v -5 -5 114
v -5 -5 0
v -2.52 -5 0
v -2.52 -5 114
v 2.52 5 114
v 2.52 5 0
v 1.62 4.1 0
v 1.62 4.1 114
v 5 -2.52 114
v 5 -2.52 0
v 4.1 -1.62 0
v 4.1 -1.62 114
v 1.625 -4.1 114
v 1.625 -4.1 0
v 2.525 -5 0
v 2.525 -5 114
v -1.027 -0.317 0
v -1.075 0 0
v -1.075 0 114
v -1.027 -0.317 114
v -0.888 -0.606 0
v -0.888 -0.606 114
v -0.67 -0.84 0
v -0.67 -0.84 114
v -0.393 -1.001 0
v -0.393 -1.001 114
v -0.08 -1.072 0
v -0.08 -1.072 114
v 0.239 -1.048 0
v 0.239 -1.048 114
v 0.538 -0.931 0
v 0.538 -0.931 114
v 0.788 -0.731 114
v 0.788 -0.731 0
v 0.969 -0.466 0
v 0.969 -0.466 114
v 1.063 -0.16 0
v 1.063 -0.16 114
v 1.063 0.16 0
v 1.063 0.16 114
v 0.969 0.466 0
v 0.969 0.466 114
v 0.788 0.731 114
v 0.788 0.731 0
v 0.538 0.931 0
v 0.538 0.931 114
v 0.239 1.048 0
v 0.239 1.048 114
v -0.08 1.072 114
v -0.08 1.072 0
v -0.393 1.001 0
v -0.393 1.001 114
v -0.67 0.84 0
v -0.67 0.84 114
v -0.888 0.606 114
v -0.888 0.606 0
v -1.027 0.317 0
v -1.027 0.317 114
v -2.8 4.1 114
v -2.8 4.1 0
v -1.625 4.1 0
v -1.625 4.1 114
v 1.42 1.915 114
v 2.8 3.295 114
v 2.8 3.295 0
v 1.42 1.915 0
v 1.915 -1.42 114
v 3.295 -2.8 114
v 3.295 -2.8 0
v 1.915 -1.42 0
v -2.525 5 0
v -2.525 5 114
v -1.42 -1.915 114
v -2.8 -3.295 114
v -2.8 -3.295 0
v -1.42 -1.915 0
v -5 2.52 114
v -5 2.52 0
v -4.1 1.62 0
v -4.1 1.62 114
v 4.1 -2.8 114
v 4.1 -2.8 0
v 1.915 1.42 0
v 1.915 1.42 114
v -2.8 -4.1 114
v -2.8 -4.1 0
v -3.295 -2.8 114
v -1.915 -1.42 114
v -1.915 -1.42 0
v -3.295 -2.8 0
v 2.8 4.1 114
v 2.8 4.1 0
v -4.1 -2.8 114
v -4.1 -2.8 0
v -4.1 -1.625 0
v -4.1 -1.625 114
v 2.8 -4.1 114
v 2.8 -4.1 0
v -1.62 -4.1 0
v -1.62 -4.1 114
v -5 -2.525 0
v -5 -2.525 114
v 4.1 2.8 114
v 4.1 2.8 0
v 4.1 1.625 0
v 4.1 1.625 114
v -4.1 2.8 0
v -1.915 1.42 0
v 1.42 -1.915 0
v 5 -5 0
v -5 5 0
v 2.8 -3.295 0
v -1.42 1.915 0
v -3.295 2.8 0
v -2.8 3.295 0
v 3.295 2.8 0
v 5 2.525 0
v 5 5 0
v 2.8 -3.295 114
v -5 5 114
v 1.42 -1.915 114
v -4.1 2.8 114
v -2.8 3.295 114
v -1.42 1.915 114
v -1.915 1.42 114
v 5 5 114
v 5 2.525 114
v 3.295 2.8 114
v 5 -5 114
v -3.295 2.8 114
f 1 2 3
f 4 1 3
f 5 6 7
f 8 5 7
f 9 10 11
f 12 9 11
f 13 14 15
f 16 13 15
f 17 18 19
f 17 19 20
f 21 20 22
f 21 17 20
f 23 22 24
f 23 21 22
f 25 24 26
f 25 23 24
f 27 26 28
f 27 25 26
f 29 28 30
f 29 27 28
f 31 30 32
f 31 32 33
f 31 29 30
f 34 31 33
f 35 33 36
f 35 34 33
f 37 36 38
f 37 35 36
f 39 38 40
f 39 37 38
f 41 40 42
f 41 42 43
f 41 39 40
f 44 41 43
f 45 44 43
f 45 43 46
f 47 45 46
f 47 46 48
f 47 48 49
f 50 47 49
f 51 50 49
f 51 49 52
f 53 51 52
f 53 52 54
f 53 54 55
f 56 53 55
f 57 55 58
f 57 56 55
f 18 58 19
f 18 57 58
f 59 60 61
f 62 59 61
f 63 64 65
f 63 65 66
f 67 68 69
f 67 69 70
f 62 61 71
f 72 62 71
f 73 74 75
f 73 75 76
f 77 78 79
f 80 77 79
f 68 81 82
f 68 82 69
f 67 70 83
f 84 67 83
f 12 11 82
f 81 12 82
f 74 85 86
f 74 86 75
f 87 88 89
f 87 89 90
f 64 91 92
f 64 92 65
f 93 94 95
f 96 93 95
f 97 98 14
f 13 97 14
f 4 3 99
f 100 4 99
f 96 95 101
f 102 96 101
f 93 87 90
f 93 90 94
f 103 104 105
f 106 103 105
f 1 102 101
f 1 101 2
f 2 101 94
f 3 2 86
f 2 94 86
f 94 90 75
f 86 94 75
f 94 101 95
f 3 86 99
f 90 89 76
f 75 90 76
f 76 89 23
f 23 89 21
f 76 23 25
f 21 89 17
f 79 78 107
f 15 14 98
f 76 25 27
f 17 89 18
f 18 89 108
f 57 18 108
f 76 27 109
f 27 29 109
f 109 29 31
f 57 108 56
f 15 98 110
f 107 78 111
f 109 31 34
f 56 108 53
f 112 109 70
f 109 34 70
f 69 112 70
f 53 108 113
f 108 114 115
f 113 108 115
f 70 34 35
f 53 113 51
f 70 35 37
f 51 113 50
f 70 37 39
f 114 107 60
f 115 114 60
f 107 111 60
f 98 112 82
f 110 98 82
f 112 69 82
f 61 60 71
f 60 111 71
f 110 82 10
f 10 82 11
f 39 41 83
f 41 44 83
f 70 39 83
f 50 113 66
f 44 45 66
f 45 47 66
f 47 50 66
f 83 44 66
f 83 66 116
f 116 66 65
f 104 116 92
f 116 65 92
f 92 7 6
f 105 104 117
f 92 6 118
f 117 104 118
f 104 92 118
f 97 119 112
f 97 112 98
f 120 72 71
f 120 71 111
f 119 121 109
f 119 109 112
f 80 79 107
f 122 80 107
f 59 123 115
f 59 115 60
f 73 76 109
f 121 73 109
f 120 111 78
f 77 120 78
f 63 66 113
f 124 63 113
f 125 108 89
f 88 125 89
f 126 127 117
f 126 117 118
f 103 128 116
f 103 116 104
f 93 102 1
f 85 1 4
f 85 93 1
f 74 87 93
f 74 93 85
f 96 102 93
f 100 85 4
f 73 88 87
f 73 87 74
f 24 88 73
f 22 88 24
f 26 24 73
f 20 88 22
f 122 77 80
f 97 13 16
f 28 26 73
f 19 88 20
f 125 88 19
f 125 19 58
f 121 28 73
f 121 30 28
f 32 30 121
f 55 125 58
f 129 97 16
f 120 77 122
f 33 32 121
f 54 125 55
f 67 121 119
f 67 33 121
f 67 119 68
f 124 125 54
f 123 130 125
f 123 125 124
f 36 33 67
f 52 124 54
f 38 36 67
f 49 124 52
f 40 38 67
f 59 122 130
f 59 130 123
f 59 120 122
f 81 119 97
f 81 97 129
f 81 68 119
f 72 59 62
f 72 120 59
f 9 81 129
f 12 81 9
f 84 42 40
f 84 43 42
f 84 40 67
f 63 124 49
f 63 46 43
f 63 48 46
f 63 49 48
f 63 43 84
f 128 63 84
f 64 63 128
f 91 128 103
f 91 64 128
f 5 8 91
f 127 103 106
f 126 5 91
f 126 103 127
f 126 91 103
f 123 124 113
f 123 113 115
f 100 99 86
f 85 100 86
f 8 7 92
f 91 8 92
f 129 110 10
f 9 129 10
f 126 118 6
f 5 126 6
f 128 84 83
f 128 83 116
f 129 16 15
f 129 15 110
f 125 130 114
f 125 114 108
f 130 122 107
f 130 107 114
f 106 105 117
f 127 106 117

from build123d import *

# Parameters (mm, degrees)
CROQUIS1_R              = 1.075
SALIENTE_EXTRUIR1_DEPTH = 114


with BuildPart() as part:
    # Croquis1 → Saliente-Extruir1 (new body)
    with BuildSketch(Plane.XY):
        Polygon((-1.420025253, 1.915), (-2.8, 3.294974747), (-2.8, 4.1), (-1.625, 4.1), (-2.525, 5), (-5, 5), (-5, 2.52), (-4.1, 1.62), (-4.1, 2.8), (-3.294974747, 2.8), (-1.915, 1.420025253), (-1.915, -1.420025253), (-3.294974747, -2.8), (-4.1, -2.8), (-4.1, -1.625), (-5, -2.525), (-5, -5), (-2.52, -5), (-1.62, -4.1), (-2.8, -4.1), (-2.8, -3.294974747), (-1.420025253, -1.915), (1.420025253, -1.915), (2.8, -3.294974747), (2.8, -4.1), (1.625, -4.1), (2.525, -5), (5, -5), (5, -2.52), (4.1, -1.62), (4.1, -2.8), (3.294974747, -2.8), (1.915, -1.420025253), (1.915, 1.420025253), (3.294974747, 2.8), (4.1, 2.8), (4.1, 1.625), (5, 2.525), (5, 5), (2.52, 5), (1.62, 4.1), (2.8, 4.1), (2.8, 3.294974747), (1.420025253, 1.915), align=None)
        with Locations(Location((0, 0, 0), (0, 0, 180))):
            Circle(CROQUIS1_R, mode=Mode.SUBTRACT)
    extrude(amount=SALIENTE_EXTRUIR1_DEPTH)


solid = part.part
